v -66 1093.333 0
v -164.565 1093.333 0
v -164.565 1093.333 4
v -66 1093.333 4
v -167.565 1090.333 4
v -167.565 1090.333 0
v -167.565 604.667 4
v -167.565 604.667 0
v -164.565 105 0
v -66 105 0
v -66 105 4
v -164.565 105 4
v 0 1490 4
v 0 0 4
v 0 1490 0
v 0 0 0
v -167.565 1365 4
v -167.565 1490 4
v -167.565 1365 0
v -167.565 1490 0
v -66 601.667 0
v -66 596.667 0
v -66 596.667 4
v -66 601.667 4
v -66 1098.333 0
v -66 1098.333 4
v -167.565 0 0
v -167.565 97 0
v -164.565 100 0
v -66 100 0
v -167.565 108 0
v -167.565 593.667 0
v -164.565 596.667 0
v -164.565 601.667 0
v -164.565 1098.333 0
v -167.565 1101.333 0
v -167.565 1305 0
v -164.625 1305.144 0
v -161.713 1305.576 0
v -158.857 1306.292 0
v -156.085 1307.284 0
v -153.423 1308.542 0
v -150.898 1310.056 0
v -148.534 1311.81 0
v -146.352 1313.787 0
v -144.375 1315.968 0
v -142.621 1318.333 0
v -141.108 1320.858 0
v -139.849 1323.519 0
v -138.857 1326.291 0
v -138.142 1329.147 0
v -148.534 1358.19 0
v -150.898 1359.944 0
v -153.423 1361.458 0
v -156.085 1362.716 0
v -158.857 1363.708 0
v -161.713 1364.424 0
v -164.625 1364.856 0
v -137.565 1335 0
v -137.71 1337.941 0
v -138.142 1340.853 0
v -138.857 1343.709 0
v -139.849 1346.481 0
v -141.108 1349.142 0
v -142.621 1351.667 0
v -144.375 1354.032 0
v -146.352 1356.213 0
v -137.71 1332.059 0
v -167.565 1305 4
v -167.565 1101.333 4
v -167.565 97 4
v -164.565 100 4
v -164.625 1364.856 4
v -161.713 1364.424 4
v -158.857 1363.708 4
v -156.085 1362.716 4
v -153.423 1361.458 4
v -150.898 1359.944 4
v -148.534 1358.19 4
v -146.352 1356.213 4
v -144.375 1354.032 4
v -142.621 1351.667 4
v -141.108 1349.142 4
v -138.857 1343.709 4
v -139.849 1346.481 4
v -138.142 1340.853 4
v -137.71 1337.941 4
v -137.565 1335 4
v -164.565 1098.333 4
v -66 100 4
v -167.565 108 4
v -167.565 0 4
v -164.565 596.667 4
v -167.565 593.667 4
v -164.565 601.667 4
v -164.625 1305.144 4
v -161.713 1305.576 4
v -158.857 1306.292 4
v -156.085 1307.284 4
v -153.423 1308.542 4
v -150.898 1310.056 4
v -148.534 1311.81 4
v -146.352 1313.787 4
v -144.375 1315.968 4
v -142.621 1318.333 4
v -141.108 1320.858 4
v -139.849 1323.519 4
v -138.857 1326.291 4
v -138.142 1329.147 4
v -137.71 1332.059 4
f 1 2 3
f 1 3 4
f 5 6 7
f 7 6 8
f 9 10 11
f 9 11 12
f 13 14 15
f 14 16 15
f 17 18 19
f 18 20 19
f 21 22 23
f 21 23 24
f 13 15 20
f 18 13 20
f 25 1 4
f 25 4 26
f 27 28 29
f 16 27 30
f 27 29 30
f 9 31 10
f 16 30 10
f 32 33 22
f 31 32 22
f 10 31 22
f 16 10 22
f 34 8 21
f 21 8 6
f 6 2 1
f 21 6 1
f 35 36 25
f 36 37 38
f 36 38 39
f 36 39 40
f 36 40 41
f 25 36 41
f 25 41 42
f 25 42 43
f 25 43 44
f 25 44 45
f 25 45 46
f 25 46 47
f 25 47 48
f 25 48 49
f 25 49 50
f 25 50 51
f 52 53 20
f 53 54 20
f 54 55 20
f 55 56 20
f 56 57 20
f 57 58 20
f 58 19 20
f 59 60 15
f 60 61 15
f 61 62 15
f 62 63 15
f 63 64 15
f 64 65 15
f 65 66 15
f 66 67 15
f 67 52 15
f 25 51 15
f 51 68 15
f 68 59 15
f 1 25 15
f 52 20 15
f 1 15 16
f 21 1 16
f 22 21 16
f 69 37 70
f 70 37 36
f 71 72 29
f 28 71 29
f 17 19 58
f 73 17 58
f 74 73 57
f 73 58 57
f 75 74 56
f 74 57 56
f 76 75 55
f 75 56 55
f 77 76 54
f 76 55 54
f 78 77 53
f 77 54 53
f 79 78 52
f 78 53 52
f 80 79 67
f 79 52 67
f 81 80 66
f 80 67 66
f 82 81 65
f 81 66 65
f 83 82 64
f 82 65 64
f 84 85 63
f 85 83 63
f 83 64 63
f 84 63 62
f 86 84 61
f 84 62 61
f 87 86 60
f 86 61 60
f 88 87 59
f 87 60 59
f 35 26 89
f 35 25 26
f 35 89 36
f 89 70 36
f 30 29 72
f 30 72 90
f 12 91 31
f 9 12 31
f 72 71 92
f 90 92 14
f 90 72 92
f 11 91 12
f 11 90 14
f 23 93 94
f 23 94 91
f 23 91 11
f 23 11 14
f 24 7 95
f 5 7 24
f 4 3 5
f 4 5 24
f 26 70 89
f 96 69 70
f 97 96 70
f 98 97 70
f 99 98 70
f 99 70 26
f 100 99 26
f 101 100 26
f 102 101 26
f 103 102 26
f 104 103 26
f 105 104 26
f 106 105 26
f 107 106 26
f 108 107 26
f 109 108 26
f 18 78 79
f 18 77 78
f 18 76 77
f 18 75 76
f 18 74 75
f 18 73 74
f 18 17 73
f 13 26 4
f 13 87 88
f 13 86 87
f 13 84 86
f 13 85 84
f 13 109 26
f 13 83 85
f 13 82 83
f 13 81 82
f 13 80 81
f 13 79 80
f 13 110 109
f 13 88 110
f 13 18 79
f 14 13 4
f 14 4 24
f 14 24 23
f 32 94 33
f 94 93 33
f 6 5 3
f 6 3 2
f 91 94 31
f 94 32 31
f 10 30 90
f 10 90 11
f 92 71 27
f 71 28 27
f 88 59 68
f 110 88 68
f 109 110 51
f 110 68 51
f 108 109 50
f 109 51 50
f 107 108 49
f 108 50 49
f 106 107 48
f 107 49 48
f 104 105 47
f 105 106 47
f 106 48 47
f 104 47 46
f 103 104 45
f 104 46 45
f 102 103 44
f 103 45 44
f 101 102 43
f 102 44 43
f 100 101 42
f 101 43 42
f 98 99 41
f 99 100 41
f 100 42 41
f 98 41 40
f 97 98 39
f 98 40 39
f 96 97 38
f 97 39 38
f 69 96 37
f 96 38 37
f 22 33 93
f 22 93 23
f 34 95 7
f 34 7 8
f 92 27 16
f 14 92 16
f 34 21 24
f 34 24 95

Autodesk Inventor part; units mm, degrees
ref_plane "YZ Plane" through (0, 0, 0) normal (1, 0, 0) x (0, 1, 0)
ref_plane "XZ Plane" through (0, 0, 0) normal (0, 1, 0) x (-1, 0, 0)
ref_plane "XY Plane" through (0, 0, 0) normal (0, 0, 1) x (1, 0, 0)
sketch "Sketch1" plane through (0, 0, 0) normal (0, 0, 1) x (1, 0, 0)
  line L0 (0, 1490) -> (-167.5654, 1490)
  line L1 (-167.5654, 1490) -> (-167.5654, 0)
  line L2 (-167.5654, 0) -> (0, 0)
  line L3 (0, 0) -> (0, 1490)
  line L4 (-167.5654, 100) -> (-66, 100)
  line L5 (-66, 100) -> (-66, 105)
  line L6 (-66, 105) -> (-167.5654, 105)
  line L7 (-167.5654, 105) -> (-167.5654, 100)
  line L8 (-167.5654, 596.6667) -> (-66, 596.6667)
  line L9 (-66, 596.6667) -> (-66, 601.6667)
  line L10 (-66, 601.6667) -> (-167.5654, 601.6667)
  line L11 (-167.5654, 601.6667) -> (-167.5654, 596.6667)
  line L12 (-167.5654, 1093.3333) -> (-66, 1093.3333)
  line L13 (-66, 1093.3333) -> (-66, 1098.3333)
  line L14 (-66, 1098.3333) -> (-167.5654, 1098.3333)
  line L15 (-167.5654, 1098.3333) -> (-167.5654, 1093.3333)
  circle A0 centre (-167.5654, 1335) radius 30
  point P0 (-167.5654, 1098.3333)
  point P1 (-167.5654, 1093.3333)
  point P2 (-167.5654, 596.6667)
  point P3 (-167.5654, 1365)
  point P4 (-167.5654, 1305)
  dimension "d0" = 1490
  dimension "d1" = 167.5654
  dimension "d2" = 5
  dimension "d4" = 100
  dimension "d7" = 496.6667
  dimension "d23" = 66
  dimension "d29" = 60
  dimension "d30" = 1335
extrude "Plate1" add sketch "Sketch1" along normal blind 4 contours L3 L2 L1 L4 L5 L6 L8 L9 L10 L12 L13 L14 A0 L0
chamfer "Corner Chamfer1" distance 3 angle 45 6 edges at (-167.5654, 100, 2) (-167.5654, 105, 2) (-167.5654, 596.6667, 2) (-167.5654, 601.6667, 2) (-167.5654, 1098.3333, 2) (-167.5654, 1093.3333, 2)
equation "\"d0\" = Стрингер_длина"
equation "\"d1\" = стрингер_глубина_3"
equation "\"d2\" = паз_под_стрингер_толщина"
equation "\"d7\" = Шаг_шпангоутов"
equation "\"d23\" = паз_под_стрингер_глубина - Thickness"
equation "\"d29\" = 2 * радиус_выреза_под_сварку"
equation "\"d12\" = Thickness"
equation "\"BendRadius\" = Thickness"
equation "\"BendReliefWidth\" = Thickness"
equation "\"BendReliefDepth\" = 0.5 * Thickness"
equation "\"CornerReliefSize\" = 4 * Thickness"
equation "\"MinimumRemnant\" = 2 * Thickness"
equation "\"TransitionRadius\" = BendRadius"
equation "\"JacobiRadiusSize\" = BendRadius"
equation "\"GapSize\" = Thickness"
equation "\"Стрингер_длина\" = 1490"
equation "\"стрингер_глубина_3\" = 167.565356"
equation "\"паз_под_стрингер_толщина\" = 5"
equation "\"Шаг_шпангоутов\" = 496.666667"
equation "\"паз_под_стрингер_глубина\" = 70"
equation "\"Thickness\" = 4"
equation "\"радиус_выреза_под_сварку\" = 30"
properties part number "GBK 3104 stringer 3" material "Steel"
